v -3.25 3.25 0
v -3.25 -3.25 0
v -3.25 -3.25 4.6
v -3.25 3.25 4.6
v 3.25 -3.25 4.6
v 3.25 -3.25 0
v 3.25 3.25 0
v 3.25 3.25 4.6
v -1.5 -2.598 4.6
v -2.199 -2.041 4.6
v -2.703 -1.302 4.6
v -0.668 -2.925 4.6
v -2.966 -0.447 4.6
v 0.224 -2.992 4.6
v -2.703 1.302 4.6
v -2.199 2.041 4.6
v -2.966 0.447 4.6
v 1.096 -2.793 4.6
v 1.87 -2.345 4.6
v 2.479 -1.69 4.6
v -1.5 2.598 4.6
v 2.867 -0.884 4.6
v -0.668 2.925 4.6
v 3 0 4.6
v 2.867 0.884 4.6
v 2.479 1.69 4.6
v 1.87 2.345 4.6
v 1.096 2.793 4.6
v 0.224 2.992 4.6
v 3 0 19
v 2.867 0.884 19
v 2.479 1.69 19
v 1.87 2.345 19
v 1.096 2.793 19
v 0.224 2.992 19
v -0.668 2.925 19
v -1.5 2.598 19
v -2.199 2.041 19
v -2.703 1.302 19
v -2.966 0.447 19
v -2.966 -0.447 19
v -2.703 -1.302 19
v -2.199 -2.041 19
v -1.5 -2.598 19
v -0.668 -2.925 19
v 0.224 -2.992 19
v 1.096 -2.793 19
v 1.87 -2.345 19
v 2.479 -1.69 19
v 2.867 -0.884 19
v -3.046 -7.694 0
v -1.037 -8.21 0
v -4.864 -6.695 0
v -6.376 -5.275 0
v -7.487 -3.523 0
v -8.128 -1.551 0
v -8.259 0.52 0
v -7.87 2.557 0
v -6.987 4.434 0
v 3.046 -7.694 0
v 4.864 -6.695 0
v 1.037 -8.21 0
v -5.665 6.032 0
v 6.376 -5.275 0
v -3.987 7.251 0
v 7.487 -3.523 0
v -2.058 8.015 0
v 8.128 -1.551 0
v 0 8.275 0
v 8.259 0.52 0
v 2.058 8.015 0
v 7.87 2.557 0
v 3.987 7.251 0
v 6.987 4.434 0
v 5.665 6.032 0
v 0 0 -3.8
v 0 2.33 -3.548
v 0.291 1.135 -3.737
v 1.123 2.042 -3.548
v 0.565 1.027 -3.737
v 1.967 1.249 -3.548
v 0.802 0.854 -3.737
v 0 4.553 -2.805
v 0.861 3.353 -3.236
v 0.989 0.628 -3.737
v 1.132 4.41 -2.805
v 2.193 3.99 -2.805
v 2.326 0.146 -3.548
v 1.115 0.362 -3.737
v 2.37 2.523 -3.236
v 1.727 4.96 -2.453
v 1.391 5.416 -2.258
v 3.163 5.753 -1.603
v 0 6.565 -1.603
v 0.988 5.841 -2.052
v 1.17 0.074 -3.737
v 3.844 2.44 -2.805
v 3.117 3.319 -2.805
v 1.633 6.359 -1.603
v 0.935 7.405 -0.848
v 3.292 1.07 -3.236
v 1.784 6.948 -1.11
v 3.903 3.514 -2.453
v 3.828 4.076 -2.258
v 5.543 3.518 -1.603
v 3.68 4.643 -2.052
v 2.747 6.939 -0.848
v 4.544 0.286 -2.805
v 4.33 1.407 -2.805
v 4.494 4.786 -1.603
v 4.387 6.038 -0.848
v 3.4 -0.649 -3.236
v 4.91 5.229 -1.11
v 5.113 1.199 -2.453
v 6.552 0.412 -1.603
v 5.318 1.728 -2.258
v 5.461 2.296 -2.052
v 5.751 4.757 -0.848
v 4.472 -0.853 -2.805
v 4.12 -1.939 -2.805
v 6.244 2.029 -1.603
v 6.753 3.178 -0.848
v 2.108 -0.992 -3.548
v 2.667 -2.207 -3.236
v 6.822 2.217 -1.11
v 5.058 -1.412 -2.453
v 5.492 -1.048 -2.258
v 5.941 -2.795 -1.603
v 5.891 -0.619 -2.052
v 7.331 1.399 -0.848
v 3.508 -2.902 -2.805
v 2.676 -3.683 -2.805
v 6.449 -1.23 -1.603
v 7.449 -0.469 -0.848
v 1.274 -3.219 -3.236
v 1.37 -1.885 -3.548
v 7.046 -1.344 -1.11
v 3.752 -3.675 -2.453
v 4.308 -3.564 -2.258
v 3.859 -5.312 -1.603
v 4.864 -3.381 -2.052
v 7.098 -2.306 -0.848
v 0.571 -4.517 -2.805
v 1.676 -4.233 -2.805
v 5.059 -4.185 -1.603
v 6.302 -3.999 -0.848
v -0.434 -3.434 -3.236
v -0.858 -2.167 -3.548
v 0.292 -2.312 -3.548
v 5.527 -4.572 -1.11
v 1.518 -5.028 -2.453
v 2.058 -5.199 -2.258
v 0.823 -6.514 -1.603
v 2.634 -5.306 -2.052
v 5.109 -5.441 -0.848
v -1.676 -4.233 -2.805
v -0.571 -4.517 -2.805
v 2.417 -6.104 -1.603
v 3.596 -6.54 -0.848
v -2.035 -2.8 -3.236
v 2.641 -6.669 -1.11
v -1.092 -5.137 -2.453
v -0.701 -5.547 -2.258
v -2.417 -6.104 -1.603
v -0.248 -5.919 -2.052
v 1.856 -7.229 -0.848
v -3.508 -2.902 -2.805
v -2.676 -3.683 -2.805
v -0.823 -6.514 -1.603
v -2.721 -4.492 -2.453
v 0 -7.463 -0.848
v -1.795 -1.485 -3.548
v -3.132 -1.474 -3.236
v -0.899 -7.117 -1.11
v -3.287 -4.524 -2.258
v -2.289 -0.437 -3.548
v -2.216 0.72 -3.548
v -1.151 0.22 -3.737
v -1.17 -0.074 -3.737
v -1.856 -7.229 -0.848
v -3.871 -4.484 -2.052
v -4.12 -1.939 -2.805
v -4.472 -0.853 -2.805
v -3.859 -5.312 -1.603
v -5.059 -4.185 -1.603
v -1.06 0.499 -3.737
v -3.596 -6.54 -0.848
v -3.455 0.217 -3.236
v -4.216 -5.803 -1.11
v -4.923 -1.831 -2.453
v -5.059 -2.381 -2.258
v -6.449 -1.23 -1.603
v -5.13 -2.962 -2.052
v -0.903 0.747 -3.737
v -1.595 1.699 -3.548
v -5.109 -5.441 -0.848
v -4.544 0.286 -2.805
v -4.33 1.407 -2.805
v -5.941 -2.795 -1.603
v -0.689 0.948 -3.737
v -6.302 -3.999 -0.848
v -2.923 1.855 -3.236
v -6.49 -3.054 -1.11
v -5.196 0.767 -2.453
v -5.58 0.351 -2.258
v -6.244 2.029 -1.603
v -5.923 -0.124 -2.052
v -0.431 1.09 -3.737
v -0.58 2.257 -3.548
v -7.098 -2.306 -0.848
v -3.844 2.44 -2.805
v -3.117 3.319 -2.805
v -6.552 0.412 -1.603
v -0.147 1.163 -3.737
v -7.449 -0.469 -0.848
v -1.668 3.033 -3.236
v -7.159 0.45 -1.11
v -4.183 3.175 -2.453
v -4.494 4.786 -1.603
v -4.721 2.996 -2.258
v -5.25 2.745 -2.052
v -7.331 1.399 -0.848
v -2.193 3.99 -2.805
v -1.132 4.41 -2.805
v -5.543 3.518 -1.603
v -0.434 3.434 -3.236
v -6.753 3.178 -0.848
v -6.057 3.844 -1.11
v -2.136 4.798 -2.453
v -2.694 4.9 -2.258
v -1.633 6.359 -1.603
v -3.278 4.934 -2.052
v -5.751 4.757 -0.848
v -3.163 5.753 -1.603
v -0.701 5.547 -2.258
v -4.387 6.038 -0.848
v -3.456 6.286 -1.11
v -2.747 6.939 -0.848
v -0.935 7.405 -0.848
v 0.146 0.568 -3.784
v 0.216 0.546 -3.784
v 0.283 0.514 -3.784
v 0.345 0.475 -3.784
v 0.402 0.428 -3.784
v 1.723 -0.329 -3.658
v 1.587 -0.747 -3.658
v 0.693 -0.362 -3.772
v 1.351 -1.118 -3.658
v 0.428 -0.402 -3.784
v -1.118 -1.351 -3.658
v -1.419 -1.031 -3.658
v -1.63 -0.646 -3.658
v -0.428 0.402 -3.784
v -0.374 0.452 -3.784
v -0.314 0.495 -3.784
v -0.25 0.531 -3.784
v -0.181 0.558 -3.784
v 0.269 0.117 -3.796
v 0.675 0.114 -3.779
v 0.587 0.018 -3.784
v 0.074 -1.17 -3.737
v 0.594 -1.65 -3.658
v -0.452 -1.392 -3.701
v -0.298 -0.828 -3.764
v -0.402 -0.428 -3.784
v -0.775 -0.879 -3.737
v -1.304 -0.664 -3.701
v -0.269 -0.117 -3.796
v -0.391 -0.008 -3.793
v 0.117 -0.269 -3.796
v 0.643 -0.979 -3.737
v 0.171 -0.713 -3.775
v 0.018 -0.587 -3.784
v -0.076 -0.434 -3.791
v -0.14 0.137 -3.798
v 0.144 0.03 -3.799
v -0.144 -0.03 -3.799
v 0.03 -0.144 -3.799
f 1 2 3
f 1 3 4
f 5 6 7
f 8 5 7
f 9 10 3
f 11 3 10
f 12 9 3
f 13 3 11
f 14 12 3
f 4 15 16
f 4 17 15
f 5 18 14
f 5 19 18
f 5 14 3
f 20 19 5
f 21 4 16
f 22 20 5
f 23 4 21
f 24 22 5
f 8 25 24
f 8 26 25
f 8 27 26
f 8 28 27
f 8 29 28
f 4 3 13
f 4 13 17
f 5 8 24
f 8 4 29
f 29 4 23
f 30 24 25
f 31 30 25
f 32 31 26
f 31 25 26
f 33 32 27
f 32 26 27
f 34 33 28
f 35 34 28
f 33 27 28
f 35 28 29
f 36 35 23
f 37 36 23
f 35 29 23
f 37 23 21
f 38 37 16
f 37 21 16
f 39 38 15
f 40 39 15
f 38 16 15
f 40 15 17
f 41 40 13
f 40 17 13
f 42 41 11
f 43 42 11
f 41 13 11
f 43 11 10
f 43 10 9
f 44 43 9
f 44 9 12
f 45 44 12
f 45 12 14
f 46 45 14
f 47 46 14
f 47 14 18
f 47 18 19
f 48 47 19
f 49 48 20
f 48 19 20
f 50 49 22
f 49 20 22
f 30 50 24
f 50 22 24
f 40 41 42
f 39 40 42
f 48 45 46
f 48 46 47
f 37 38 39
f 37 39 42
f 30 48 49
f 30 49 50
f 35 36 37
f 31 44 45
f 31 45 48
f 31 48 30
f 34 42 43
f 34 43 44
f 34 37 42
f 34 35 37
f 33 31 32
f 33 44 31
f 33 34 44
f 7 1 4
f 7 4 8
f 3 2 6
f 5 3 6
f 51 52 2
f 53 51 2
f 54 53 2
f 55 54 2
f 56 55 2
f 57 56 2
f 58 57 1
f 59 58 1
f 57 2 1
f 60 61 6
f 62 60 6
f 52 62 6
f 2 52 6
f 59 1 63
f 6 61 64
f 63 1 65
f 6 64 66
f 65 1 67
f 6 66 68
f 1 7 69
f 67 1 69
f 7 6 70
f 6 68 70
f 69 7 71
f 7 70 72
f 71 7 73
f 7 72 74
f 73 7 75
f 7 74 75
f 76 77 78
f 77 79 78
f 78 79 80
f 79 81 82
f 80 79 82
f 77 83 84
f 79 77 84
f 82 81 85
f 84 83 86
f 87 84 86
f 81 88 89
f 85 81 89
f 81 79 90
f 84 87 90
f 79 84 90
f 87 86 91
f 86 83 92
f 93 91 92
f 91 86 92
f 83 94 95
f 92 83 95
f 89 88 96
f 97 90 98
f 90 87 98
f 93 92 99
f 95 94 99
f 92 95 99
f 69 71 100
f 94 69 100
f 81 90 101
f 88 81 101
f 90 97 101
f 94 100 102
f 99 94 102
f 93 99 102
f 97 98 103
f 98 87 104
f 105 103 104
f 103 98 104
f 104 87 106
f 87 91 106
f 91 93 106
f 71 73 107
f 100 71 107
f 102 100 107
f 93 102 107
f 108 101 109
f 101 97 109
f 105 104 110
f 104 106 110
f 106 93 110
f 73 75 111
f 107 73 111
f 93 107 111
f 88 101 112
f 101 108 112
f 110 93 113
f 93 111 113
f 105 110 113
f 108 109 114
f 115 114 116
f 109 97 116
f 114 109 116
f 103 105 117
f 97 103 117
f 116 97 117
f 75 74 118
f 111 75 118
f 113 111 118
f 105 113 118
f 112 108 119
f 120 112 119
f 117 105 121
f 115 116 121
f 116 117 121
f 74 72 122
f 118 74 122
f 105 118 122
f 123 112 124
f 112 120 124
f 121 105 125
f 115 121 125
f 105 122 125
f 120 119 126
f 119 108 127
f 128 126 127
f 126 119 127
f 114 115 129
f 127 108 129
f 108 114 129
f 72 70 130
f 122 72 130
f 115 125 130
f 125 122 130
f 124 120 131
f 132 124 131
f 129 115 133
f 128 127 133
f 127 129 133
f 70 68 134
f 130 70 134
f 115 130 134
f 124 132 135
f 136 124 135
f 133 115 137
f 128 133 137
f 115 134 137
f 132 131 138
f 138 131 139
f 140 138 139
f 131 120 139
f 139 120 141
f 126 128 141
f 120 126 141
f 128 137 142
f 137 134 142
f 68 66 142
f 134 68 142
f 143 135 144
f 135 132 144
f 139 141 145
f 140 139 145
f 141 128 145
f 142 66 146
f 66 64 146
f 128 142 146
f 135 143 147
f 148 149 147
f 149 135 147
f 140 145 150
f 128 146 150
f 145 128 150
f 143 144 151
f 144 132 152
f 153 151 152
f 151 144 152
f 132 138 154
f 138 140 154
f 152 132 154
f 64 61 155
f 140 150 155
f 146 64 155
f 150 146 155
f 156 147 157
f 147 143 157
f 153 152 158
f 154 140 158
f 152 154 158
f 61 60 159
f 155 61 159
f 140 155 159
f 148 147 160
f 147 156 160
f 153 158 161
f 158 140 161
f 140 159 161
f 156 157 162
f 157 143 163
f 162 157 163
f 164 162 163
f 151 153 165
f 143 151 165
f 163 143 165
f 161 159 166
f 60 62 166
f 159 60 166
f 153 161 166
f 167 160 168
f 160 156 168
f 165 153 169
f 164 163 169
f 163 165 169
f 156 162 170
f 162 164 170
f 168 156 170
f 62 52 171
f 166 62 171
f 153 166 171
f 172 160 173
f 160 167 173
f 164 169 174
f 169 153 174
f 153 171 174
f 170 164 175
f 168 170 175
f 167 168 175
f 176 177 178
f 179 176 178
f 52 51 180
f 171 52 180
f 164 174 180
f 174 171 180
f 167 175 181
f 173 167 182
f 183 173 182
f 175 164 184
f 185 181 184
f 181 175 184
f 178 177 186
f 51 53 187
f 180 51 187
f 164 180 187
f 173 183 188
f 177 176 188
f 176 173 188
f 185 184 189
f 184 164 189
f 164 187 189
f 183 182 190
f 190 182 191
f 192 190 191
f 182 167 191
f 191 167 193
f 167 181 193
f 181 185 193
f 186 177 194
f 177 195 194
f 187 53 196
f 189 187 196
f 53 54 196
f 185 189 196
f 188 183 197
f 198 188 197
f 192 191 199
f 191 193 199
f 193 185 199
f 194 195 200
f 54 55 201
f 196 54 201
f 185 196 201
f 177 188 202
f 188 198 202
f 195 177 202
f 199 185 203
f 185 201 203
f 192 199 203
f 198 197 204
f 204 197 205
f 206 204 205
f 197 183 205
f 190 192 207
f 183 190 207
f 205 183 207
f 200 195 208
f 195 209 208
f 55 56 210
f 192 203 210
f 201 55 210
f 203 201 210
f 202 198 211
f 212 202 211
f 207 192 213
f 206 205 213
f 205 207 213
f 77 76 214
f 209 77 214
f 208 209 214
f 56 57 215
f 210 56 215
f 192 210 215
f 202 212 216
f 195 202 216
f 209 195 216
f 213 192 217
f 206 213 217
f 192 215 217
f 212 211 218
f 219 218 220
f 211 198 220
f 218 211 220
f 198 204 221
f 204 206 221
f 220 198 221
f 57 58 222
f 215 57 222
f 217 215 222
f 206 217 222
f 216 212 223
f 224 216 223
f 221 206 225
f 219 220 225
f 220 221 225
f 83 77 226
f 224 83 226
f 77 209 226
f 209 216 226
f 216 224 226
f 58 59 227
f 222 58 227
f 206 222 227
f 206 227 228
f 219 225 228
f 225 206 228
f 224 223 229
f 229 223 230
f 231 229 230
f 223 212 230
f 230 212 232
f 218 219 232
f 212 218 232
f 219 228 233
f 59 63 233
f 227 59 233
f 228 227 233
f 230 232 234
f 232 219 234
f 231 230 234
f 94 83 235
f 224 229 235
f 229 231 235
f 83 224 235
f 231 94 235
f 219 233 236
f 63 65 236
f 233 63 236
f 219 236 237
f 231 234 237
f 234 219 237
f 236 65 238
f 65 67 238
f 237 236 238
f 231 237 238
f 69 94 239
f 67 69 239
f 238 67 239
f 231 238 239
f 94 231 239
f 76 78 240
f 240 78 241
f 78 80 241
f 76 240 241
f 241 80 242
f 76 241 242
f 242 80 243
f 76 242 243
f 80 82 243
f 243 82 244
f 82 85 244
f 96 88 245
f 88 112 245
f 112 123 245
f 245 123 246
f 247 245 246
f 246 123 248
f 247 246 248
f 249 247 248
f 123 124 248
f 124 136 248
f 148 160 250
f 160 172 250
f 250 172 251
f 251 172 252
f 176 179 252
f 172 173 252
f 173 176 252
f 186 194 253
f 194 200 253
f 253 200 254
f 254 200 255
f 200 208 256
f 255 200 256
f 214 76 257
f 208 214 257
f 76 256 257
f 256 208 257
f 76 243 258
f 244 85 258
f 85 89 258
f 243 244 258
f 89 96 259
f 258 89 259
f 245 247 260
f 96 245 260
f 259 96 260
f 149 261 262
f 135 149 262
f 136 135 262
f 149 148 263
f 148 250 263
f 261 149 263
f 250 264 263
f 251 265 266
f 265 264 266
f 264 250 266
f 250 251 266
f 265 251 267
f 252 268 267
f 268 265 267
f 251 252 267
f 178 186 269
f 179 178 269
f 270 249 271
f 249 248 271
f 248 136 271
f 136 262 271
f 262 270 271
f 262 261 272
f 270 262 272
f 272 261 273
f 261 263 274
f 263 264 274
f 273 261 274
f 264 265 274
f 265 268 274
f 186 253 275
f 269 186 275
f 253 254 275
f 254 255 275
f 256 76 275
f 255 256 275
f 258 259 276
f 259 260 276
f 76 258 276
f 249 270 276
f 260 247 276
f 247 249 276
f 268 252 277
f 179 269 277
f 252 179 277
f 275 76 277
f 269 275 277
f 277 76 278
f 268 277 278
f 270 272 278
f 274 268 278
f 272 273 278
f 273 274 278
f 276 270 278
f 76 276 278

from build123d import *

# Parameters (mm, degrees)
F0_W     = 6.5
F0_H     = 6.5
F1_DEPTH = 4.6
F2_R     = 3
F3_DEPTH = 14.4


with BuildPart() as f1:
    # F0 (on Top) → F1 (new body)
    with BuildSketch(Plane.XY):
        Rectangle(F0_W, F0_H)
    extrude(amount=F1_DEPTH)

    # F2 (on face) → F3 (join)
    with BuildSketch(Plane.XY.offset(4.6)):
        Circle(F2_R)
    extrude(amount=F3_DEPTH)

    # F4 (on Right) → F5 (revolve)
    with BuildSketch(Plane.YZ):
        with BuildLine():
            ThreePointArc((0, -3.8), (4.552901, -2.80459), (8.275, 0))
            Line((8.275, 0), (0, 0))
            Line((0, 0), (0, -3.8))
        make_face()
    revolve(axis=Axis((0, 0, -1.9), (0, 0, -1)))


solid = f1.part
